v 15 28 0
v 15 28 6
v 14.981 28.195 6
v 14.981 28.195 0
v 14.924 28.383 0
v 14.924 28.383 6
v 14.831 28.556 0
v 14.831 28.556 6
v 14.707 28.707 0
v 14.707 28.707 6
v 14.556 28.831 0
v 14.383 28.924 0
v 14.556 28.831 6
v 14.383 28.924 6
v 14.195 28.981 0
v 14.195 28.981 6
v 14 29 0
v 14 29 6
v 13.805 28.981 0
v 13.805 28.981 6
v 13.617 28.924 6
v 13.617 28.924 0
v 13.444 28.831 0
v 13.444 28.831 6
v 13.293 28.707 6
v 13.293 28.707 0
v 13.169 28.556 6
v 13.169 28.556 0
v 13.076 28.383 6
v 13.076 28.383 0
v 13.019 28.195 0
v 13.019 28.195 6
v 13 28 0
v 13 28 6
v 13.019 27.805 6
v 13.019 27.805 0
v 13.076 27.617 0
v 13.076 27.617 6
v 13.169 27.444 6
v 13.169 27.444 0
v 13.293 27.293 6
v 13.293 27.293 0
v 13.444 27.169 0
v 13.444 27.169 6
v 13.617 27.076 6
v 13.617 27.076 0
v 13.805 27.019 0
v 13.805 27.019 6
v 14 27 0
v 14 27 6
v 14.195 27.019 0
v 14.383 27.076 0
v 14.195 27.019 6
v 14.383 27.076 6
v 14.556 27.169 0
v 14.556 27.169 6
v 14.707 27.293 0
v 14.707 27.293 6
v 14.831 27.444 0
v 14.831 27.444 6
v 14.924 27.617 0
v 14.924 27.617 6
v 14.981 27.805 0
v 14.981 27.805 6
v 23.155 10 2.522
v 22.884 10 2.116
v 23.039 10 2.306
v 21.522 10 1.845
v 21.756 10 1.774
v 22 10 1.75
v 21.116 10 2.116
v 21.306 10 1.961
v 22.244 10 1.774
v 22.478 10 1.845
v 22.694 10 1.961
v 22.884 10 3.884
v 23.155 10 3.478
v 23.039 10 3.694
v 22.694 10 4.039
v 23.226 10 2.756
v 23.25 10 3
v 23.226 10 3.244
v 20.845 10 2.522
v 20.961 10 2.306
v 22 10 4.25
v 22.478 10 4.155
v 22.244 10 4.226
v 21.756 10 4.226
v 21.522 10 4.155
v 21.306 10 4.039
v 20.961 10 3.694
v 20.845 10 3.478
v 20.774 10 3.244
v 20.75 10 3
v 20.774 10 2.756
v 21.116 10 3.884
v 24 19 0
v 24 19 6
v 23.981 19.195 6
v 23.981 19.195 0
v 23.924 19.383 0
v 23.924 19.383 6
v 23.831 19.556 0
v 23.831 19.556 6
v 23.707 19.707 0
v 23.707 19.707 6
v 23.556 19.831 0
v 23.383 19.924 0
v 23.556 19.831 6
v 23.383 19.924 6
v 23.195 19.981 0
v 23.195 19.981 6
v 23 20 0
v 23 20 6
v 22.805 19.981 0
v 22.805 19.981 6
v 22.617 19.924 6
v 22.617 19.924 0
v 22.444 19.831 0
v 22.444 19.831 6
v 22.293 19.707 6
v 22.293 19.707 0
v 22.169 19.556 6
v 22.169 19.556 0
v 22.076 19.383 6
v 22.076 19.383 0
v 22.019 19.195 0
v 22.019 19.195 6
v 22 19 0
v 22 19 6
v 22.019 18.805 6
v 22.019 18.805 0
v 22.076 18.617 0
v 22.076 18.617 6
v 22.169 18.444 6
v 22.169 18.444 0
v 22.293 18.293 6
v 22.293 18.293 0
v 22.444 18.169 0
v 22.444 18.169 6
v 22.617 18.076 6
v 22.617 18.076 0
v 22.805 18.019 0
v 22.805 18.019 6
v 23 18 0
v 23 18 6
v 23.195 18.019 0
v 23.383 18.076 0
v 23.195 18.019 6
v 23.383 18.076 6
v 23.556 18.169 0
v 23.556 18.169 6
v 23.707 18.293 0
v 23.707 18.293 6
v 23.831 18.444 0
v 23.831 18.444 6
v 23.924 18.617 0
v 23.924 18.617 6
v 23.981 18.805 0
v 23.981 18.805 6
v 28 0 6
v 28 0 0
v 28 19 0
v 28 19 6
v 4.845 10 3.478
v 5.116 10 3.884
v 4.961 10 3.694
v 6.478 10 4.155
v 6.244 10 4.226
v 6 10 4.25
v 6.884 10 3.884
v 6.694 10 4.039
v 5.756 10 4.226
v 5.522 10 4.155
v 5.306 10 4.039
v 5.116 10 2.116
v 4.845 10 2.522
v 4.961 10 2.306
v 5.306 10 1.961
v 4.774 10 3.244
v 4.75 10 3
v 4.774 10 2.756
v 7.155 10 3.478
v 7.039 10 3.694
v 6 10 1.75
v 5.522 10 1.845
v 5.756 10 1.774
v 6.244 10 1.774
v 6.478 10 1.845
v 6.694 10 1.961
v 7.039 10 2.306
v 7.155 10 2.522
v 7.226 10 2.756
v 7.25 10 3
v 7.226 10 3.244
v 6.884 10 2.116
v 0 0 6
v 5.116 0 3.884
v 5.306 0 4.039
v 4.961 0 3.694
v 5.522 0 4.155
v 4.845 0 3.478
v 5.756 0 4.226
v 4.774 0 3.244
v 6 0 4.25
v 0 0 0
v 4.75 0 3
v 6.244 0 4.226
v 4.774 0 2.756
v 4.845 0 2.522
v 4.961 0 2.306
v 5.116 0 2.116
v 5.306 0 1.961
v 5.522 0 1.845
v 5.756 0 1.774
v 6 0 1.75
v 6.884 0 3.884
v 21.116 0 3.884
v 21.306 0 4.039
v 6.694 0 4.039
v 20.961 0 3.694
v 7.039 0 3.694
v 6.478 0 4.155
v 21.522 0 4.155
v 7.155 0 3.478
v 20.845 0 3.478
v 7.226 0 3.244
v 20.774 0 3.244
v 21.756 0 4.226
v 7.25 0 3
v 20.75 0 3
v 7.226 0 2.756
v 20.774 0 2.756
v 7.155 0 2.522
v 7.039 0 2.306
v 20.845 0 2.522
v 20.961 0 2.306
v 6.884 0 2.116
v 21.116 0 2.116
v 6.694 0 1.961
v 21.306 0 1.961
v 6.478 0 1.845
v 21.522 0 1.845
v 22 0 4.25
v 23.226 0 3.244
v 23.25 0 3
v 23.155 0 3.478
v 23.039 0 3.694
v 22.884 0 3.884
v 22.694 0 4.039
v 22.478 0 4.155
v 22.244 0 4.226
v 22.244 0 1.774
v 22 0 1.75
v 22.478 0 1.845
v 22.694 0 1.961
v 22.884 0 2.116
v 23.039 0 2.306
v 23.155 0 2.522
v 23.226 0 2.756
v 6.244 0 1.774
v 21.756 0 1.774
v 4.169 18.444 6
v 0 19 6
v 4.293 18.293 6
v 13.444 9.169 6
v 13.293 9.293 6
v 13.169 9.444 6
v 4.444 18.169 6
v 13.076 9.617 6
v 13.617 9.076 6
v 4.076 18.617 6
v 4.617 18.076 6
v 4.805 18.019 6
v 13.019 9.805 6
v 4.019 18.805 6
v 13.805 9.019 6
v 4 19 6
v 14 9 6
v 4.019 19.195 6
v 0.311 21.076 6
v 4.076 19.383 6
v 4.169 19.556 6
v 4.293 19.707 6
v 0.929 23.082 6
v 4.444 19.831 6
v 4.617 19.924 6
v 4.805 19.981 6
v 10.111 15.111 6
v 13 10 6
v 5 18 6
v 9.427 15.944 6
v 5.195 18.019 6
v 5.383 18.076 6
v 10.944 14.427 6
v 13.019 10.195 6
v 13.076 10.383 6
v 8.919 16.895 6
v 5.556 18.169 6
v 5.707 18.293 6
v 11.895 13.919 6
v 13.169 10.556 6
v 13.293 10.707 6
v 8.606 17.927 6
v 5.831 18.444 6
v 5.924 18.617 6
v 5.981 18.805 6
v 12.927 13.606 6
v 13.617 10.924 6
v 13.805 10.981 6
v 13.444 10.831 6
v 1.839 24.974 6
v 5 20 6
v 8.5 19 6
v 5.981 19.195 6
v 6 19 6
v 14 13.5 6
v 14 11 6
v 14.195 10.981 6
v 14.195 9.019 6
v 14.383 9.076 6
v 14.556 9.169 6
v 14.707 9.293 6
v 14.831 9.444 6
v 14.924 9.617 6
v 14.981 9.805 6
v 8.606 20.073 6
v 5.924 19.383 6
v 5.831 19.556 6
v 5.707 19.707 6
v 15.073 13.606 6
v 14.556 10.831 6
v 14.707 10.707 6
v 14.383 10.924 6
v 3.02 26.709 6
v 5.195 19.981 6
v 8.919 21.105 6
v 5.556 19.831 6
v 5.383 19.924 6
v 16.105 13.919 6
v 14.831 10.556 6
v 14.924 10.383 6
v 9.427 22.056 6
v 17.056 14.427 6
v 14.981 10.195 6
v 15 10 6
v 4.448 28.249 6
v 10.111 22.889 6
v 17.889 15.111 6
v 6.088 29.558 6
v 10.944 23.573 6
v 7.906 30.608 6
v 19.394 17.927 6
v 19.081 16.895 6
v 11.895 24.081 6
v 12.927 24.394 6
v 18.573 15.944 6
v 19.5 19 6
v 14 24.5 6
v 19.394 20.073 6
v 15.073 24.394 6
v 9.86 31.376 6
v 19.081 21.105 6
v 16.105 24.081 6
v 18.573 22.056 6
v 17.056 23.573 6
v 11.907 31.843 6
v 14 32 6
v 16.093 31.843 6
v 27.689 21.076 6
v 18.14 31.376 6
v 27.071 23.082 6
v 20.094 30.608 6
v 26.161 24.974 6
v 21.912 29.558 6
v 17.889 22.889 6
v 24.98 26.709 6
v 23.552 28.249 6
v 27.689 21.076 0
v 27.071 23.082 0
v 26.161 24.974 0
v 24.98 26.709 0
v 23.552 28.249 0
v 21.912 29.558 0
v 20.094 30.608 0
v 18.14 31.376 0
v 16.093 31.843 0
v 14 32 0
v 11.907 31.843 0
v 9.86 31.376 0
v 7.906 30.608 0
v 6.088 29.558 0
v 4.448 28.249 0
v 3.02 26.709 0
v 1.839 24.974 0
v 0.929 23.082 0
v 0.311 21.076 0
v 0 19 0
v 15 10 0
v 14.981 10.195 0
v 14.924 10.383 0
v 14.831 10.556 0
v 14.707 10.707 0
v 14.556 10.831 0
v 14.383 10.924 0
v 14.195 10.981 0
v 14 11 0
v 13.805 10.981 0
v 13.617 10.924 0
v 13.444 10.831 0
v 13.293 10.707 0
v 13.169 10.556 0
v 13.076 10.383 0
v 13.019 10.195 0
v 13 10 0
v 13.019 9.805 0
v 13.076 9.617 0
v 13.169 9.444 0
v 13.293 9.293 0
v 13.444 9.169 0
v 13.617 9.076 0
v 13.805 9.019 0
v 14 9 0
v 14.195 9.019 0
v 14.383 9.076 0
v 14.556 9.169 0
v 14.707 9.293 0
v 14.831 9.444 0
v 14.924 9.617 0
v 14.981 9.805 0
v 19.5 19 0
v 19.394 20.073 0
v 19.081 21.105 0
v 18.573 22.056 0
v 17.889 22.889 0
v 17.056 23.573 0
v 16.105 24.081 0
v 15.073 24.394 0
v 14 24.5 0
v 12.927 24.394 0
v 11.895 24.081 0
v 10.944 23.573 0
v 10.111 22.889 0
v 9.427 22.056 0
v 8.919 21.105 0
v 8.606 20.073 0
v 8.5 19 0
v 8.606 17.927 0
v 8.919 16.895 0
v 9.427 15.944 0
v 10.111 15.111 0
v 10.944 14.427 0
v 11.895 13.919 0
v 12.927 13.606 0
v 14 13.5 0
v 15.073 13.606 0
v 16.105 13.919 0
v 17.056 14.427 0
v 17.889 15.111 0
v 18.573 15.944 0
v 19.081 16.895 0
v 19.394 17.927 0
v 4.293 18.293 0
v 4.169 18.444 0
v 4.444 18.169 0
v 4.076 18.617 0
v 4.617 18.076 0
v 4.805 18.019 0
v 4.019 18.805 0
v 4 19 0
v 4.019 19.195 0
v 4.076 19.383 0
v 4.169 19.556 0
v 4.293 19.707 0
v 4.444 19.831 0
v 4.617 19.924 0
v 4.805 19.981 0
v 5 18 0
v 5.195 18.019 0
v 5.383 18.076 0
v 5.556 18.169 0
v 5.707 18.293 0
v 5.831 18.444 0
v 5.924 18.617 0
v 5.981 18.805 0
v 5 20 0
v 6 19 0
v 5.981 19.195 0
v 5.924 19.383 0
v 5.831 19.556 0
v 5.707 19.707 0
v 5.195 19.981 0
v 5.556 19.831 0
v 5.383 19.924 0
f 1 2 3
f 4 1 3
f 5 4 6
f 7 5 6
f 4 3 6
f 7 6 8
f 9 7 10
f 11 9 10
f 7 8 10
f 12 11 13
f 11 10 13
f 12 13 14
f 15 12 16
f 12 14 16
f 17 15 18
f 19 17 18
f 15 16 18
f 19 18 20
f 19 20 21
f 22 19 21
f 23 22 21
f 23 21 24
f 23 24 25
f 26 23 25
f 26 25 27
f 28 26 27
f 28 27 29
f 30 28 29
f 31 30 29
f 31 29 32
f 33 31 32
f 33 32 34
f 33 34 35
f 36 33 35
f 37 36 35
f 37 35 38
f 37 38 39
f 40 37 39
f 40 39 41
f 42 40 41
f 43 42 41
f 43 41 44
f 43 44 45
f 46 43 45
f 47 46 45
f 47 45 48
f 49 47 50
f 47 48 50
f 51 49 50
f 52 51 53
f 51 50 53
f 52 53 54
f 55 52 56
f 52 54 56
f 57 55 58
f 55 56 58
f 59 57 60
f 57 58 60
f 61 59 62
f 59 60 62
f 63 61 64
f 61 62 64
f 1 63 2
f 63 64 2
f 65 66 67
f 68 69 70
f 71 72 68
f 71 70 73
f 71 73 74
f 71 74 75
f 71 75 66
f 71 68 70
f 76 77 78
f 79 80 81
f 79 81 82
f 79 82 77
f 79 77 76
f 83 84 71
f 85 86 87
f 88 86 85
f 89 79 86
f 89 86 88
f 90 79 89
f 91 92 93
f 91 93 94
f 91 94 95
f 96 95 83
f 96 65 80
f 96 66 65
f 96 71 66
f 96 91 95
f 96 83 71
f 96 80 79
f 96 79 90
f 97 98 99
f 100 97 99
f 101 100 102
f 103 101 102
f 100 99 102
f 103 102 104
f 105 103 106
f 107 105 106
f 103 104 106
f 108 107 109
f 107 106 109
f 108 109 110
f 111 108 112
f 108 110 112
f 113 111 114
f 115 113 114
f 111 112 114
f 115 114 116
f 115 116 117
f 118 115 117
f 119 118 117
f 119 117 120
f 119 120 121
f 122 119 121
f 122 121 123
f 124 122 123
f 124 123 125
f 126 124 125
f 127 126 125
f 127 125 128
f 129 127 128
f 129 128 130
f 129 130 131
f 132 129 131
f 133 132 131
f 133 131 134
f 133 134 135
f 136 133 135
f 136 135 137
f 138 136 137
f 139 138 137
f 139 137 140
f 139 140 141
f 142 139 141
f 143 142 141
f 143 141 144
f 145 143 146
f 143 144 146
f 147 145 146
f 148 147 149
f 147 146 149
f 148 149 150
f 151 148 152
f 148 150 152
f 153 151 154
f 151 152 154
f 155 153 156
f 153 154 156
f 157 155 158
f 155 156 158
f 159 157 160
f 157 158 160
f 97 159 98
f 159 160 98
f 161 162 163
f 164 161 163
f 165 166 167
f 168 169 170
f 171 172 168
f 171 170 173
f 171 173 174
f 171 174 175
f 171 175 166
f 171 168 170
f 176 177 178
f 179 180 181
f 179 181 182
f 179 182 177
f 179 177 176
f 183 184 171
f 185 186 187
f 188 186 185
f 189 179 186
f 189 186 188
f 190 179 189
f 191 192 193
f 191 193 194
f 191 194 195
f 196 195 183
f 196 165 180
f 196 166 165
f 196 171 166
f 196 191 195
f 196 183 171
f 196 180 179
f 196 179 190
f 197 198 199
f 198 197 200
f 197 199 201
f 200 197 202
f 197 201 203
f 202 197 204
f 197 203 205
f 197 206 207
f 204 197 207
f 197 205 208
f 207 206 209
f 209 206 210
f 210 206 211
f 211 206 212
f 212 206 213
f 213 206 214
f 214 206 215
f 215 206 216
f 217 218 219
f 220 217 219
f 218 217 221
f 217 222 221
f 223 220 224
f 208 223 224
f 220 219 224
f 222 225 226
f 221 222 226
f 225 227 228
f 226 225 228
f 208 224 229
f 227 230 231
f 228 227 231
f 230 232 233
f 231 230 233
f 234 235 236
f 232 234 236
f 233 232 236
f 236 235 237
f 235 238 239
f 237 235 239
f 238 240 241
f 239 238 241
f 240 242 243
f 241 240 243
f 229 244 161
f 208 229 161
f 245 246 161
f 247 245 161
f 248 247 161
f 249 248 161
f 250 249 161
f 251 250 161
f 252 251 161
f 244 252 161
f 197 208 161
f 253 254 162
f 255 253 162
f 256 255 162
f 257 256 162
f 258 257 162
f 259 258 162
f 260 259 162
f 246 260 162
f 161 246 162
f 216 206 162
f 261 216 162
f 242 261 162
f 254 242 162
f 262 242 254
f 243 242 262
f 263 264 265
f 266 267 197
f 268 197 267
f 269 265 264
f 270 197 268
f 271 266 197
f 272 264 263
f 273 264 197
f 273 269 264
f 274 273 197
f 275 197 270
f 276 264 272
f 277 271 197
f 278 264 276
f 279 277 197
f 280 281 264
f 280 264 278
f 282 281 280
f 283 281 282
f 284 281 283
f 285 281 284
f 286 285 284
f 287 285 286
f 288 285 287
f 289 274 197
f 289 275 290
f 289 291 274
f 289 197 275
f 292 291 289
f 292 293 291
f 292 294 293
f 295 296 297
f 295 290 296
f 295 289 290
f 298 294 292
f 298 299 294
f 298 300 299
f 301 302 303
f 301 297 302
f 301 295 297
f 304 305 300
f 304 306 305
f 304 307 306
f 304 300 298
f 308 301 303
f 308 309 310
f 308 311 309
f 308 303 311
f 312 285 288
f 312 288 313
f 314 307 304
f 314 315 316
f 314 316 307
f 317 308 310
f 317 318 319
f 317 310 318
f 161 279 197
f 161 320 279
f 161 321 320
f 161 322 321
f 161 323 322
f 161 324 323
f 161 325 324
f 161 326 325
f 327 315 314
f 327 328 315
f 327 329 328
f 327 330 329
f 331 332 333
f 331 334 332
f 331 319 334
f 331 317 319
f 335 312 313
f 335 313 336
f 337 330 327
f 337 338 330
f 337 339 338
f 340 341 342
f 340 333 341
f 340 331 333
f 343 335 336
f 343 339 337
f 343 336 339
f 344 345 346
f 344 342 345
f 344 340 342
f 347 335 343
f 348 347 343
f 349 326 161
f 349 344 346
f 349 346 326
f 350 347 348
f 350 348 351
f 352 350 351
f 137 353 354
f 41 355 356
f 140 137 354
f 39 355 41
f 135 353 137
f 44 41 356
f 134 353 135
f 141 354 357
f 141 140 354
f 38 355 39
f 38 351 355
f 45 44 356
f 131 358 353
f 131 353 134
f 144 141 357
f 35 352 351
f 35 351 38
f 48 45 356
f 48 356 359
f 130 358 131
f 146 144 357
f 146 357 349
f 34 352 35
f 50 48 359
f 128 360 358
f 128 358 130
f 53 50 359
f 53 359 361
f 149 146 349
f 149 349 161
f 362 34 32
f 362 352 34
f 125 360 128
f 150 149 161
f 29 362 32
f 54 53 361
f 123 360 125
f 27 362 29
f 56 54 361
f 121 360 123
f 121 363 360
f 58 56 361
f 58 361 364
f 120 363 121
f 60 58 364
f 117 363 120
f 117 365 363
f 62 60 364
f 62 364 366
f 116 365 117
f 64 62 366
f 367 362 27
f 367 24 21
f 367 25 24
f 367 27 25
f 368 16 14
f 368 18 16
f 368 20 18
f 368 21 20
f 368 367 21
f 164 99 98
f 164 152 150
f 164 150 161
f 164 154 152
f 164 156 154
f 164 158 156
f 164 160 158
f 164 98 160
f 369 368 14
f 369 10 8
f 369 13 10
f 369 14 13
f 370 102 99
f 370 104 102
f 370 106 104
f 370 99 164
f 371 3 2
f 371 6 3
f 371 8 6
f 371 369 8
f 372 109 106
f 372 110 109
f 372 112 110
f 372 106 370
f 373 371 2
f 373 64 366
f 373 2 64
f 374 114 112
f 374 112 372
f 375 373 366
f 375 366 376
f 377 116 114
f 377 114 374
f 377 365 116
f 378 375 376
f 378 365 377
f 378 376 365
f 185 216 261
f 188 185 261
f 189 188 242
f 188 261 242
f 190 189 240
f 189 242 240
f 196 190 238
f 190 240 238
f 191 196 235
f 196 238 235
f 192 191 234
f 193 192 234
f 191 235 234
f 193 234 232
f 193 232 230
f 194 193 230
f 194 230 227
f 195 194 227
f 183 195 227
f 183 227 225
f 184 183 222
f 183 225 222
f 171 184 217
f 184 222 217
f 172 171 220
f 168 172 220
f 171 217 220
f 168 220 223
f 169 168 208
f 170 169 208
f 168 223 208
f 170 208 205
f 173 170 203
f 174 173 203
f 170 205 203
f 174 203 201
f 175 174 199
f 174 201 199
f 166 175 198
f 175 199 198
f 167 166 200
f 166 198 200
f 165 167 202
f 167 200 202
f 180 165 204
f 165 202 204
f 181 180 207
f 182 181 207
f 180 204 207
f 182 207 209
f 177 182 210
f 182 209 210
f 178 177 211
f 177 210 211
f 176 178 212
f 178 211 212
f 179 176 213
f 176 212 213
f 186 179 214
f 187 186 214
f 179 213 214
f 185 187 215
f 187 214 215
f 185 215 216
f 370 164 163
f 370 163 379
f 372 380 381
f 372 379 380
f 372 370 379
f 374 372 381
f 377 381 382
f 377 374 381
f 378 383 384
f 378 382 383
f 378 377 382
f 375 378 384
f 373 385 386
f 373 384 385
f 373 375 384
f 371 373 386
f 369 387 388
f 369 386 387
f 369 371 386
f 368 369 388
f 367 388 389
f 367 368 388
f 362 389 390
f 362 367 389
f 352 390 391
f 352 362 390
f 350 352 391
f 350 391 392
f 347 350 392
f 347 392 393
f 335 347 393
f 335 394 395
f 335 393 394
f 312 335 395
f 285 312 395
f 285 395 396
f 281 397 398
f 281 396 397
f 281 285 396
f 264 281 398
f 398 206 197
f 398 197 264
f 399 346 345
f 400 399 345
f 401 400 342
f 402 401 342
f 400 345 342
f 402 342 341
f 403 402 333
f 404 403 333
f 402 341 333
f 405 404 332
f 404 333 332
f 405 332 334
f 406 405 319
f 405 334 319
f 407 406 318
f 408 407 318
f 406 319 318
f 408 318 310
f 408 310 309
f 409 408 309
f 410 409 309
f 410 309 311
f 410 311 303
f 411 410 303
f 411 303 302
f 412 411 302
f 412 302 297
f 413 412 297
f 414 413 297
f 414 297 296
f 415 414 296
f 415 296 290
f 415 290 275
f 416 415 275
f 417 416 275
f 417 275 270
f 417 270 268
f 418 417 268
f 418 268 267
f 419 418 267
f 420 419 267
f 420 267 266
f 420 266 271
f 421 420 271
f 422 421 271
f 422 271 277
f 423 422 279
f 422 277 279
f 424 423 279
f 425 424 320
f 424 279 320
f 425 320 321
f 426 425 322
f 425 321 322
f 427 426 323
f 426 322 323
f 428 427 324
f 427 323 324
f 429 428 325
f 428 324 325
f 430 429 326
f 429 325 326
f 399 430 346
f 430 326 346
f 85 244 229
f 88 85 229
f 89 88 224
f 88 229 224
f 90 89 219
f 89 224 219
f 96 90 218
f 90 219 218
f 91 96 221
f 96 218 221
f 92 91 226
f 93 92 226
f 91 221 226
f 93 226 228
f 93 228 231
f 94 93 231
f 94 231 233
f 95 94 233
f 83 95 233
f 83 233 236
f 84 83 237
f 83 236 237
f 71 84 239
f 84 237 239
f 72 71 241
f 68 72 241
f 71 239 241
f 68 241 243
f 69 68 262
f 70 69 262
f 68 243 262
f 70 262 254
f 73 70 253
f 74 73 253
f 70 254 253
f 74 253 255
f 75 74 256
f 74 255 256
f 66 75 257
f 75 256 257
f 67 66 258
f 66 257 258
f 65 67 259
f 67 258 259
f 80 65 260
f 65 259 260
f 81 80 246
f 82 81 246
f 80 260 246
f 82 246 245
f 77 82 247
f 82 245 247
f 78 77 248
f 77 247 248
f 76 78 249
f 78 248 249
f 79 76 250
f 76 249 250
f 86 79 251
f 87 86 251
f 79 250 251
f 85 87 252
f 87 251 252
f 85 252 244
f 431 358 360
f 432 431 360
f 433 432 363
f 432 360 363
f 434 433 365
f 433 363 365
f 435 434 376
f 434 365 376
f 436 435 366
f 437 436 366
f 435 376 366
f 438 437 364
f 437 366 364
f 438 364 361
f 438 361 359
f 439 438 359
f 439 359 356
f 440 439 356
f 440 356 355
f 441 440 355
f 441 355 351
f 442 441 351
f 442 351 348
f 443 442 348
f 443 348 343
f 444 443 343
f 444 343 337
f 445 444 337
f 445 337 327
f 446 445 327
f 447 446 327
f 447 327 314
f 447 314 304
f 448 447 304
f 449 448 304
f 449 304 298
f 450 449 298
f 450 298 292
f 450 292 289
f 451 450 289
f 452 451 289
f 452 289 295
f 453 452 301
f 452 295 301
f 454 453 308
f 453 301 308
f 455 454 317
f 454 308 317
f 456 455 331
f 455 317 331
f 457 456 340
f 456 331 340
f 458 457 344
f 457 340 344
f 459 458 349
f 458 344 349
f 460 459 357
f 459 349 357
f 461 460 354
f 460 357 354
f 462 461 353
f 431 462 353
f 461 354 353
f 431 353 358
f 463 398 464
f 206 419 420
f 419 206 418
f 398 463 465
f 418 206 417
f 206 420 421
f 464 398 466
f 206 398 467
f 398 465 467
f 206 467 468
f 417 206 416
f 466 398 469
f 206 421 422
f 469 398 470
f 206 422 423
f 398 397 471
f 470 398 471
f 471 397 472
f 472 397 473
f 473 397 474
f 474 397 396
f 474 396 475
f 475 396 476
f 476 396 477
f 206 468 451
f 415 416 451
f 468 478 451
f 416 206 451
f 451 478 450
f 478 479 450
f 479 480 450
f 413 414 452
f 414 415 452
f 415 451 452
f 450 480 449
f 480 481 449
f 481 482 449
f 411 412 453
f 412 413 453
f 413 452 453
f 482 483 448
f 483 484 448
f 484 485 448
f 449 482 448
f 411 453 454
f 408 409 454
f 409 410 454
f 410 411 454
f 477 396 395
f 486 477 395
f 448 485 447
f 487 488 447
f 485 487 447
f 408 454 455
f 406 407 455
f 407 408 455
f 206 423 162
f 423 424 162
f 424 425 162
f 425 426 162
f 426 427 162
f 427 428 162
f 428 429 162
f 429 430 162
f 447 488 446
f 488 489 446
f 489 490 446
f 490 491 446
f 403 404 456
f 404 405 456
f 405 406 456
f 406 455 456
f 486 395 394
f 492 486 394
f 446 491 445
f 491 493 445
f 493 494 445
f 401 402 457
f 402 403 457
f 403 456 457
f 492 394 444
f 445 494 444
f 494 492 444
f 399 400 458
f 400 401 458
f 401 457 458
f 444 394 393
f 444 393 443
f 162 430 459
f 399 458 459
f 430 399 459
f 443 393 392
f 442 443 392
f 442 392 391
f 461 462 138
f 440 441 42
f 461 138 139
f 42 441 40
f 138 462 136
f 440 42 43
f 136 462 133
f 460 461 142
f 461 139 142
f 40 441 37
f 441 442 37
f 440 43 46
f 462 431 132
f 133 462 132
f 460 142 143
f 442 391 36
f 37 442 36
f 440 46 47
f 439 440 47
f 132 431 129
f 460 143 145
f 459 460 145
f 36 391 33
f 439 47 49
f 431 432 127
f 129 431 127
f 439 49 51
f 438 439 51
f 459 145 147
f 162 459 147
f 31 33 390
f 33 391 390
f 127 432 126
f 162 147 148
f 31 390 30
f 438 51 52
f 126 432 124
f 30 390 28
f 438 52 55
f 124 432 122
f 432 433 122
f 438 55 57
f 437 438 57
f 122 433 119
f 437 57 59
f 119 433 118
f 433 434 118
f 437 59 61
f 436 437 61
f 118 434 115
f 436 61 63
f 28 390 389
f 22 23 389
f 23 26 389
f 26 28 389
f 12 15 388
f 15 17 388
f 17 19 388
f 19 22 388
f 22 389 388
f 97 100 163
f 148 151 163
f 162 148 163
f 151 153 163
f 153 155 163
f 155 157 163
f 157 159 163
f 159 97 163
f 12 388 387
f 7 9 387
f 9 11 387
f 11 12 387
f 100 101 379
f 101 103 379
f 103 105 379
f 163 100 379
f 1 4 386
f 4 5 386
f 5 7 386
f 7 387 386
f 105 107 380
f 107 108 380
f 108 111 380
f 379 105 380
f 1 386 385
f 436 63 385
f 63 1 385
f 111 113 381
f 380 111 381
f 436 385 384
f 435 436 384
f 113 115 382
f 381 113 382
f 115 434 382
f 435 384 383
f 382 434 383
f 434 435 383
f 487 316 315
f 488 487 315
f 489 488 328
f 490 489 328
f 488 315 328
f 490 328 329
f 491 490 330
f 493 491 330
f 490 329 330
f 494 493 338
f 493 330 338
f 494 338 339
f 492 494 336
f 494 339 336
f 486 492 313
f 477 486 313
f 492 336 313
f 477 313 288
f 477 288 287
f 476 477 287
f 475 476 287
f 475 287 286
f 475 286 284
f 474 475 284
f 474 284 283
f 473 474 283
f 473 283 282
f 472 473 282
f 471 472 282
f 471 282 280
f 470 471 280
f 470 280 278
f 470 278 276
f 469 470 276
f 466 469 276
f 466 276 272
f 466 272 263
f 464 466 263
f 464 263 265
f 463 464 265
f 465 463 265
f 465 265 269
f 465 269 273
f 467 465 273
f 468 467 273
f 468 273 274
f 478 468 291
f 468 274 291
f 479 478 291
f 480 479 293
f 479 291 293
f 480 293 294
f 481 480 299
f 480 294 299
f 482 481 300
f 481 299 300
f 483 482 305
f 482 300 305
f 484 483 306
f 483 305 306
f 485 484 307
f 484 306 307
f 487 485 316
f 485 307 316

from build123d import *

# Parameters (mm, degrees)
ESQUISSE1_W             = 28
ESQUISSE1_H             = 32
BOSS_EXTRU_1_DEPTH      = 6
ESQUISSE2_R             = 1.25
ENL_V_MAT_EXTRU_1_DEPTH = 10
ESQUISSE3_R             = 5.5
ENL_V_MAT_EXTRU_2_DEPTH = 43.941821107
ESQUISSE4_R             = 1
ENL_V_MAT_EXTRU_4_DEPTH = 43.941821107
ENL_V_MAT_EXTRU_5_DEPTH = 43.941821107


with BuildPart() as part:
    # Esquisse1 → Boss.-Extru.1 (new body)
    with BuildSketch(Plane.XY):
        with Locations((14, 16)):
            Rectangle(ESQUISSE1_W, ESQUISSE1_H)
    extrude(amount=BOSS_EXTRU_1_DEPTH)

    # Esquisse2 → Enlèv. mat.-Extru.1 (cut)
    with BuildSketch(Plane.XZ):
        with Locations(Location((6, 3, 0), (0, 0, 270))):
            Circle(ESQUISSE2_R)
        with Locations(Location((22, 3, 0), (0, 0, 90))):
            Circle(ESQUISSE2_R)
    extrude(amount=-ENL_V_MAT_EXTRU_1_DEPTH, mode=Mode.SUBTRACT)

    # Esquisse3 → Enlèv. mat.-Extru.2 (cut, through all)
    with BuildSketch(Plane.XY.offset(6)):
        with Locations((14, 19)):
            Circle(ESQUISSE3_R)
    extrude(amount=-ENL_V_MAT_EXTRU_2_DEPTH, mode=Mode.SUBTRACT)

    # Esquisse4 → Enlèv. mat.-Extru.4 (cut, through all)
    with BuildSketch(Plane.XY.offset(6)):
        with Locations((14, 10)):
            Circle(ESQUISSE4_R)
        with Locations((5, 19)):
            Circle(ESQUISSE4_R)
        with Locations((14, 28)):
            Circle(ESQUISSE4_R)
        with Locations((23, 19)):
            Circle(ESQUISSE4_R)
    extrude(amount=-ENL_V_MAT_EXTRU_4_DEPTH, mode=Mode.SUBTRACT)

    # Esquisse5 → Enlèv. mat.-Extru.5 (cut, through all)
    with BuildSketch(Plane.XY.offset(6)):
        with BuildLine():
            Line((0, 19), (0, 33))
            Line((0, 33), (28, 33))
            Line((28, 33), (28, 19))
            ThreePointArc((28, 19), (14, 32), (0, 19))
        make_face()
    extrude(amount=-ENL_V_MAT_EXTRU_5_DEPTH, mode=Mode.SUBTRACT)


solid = part.part
